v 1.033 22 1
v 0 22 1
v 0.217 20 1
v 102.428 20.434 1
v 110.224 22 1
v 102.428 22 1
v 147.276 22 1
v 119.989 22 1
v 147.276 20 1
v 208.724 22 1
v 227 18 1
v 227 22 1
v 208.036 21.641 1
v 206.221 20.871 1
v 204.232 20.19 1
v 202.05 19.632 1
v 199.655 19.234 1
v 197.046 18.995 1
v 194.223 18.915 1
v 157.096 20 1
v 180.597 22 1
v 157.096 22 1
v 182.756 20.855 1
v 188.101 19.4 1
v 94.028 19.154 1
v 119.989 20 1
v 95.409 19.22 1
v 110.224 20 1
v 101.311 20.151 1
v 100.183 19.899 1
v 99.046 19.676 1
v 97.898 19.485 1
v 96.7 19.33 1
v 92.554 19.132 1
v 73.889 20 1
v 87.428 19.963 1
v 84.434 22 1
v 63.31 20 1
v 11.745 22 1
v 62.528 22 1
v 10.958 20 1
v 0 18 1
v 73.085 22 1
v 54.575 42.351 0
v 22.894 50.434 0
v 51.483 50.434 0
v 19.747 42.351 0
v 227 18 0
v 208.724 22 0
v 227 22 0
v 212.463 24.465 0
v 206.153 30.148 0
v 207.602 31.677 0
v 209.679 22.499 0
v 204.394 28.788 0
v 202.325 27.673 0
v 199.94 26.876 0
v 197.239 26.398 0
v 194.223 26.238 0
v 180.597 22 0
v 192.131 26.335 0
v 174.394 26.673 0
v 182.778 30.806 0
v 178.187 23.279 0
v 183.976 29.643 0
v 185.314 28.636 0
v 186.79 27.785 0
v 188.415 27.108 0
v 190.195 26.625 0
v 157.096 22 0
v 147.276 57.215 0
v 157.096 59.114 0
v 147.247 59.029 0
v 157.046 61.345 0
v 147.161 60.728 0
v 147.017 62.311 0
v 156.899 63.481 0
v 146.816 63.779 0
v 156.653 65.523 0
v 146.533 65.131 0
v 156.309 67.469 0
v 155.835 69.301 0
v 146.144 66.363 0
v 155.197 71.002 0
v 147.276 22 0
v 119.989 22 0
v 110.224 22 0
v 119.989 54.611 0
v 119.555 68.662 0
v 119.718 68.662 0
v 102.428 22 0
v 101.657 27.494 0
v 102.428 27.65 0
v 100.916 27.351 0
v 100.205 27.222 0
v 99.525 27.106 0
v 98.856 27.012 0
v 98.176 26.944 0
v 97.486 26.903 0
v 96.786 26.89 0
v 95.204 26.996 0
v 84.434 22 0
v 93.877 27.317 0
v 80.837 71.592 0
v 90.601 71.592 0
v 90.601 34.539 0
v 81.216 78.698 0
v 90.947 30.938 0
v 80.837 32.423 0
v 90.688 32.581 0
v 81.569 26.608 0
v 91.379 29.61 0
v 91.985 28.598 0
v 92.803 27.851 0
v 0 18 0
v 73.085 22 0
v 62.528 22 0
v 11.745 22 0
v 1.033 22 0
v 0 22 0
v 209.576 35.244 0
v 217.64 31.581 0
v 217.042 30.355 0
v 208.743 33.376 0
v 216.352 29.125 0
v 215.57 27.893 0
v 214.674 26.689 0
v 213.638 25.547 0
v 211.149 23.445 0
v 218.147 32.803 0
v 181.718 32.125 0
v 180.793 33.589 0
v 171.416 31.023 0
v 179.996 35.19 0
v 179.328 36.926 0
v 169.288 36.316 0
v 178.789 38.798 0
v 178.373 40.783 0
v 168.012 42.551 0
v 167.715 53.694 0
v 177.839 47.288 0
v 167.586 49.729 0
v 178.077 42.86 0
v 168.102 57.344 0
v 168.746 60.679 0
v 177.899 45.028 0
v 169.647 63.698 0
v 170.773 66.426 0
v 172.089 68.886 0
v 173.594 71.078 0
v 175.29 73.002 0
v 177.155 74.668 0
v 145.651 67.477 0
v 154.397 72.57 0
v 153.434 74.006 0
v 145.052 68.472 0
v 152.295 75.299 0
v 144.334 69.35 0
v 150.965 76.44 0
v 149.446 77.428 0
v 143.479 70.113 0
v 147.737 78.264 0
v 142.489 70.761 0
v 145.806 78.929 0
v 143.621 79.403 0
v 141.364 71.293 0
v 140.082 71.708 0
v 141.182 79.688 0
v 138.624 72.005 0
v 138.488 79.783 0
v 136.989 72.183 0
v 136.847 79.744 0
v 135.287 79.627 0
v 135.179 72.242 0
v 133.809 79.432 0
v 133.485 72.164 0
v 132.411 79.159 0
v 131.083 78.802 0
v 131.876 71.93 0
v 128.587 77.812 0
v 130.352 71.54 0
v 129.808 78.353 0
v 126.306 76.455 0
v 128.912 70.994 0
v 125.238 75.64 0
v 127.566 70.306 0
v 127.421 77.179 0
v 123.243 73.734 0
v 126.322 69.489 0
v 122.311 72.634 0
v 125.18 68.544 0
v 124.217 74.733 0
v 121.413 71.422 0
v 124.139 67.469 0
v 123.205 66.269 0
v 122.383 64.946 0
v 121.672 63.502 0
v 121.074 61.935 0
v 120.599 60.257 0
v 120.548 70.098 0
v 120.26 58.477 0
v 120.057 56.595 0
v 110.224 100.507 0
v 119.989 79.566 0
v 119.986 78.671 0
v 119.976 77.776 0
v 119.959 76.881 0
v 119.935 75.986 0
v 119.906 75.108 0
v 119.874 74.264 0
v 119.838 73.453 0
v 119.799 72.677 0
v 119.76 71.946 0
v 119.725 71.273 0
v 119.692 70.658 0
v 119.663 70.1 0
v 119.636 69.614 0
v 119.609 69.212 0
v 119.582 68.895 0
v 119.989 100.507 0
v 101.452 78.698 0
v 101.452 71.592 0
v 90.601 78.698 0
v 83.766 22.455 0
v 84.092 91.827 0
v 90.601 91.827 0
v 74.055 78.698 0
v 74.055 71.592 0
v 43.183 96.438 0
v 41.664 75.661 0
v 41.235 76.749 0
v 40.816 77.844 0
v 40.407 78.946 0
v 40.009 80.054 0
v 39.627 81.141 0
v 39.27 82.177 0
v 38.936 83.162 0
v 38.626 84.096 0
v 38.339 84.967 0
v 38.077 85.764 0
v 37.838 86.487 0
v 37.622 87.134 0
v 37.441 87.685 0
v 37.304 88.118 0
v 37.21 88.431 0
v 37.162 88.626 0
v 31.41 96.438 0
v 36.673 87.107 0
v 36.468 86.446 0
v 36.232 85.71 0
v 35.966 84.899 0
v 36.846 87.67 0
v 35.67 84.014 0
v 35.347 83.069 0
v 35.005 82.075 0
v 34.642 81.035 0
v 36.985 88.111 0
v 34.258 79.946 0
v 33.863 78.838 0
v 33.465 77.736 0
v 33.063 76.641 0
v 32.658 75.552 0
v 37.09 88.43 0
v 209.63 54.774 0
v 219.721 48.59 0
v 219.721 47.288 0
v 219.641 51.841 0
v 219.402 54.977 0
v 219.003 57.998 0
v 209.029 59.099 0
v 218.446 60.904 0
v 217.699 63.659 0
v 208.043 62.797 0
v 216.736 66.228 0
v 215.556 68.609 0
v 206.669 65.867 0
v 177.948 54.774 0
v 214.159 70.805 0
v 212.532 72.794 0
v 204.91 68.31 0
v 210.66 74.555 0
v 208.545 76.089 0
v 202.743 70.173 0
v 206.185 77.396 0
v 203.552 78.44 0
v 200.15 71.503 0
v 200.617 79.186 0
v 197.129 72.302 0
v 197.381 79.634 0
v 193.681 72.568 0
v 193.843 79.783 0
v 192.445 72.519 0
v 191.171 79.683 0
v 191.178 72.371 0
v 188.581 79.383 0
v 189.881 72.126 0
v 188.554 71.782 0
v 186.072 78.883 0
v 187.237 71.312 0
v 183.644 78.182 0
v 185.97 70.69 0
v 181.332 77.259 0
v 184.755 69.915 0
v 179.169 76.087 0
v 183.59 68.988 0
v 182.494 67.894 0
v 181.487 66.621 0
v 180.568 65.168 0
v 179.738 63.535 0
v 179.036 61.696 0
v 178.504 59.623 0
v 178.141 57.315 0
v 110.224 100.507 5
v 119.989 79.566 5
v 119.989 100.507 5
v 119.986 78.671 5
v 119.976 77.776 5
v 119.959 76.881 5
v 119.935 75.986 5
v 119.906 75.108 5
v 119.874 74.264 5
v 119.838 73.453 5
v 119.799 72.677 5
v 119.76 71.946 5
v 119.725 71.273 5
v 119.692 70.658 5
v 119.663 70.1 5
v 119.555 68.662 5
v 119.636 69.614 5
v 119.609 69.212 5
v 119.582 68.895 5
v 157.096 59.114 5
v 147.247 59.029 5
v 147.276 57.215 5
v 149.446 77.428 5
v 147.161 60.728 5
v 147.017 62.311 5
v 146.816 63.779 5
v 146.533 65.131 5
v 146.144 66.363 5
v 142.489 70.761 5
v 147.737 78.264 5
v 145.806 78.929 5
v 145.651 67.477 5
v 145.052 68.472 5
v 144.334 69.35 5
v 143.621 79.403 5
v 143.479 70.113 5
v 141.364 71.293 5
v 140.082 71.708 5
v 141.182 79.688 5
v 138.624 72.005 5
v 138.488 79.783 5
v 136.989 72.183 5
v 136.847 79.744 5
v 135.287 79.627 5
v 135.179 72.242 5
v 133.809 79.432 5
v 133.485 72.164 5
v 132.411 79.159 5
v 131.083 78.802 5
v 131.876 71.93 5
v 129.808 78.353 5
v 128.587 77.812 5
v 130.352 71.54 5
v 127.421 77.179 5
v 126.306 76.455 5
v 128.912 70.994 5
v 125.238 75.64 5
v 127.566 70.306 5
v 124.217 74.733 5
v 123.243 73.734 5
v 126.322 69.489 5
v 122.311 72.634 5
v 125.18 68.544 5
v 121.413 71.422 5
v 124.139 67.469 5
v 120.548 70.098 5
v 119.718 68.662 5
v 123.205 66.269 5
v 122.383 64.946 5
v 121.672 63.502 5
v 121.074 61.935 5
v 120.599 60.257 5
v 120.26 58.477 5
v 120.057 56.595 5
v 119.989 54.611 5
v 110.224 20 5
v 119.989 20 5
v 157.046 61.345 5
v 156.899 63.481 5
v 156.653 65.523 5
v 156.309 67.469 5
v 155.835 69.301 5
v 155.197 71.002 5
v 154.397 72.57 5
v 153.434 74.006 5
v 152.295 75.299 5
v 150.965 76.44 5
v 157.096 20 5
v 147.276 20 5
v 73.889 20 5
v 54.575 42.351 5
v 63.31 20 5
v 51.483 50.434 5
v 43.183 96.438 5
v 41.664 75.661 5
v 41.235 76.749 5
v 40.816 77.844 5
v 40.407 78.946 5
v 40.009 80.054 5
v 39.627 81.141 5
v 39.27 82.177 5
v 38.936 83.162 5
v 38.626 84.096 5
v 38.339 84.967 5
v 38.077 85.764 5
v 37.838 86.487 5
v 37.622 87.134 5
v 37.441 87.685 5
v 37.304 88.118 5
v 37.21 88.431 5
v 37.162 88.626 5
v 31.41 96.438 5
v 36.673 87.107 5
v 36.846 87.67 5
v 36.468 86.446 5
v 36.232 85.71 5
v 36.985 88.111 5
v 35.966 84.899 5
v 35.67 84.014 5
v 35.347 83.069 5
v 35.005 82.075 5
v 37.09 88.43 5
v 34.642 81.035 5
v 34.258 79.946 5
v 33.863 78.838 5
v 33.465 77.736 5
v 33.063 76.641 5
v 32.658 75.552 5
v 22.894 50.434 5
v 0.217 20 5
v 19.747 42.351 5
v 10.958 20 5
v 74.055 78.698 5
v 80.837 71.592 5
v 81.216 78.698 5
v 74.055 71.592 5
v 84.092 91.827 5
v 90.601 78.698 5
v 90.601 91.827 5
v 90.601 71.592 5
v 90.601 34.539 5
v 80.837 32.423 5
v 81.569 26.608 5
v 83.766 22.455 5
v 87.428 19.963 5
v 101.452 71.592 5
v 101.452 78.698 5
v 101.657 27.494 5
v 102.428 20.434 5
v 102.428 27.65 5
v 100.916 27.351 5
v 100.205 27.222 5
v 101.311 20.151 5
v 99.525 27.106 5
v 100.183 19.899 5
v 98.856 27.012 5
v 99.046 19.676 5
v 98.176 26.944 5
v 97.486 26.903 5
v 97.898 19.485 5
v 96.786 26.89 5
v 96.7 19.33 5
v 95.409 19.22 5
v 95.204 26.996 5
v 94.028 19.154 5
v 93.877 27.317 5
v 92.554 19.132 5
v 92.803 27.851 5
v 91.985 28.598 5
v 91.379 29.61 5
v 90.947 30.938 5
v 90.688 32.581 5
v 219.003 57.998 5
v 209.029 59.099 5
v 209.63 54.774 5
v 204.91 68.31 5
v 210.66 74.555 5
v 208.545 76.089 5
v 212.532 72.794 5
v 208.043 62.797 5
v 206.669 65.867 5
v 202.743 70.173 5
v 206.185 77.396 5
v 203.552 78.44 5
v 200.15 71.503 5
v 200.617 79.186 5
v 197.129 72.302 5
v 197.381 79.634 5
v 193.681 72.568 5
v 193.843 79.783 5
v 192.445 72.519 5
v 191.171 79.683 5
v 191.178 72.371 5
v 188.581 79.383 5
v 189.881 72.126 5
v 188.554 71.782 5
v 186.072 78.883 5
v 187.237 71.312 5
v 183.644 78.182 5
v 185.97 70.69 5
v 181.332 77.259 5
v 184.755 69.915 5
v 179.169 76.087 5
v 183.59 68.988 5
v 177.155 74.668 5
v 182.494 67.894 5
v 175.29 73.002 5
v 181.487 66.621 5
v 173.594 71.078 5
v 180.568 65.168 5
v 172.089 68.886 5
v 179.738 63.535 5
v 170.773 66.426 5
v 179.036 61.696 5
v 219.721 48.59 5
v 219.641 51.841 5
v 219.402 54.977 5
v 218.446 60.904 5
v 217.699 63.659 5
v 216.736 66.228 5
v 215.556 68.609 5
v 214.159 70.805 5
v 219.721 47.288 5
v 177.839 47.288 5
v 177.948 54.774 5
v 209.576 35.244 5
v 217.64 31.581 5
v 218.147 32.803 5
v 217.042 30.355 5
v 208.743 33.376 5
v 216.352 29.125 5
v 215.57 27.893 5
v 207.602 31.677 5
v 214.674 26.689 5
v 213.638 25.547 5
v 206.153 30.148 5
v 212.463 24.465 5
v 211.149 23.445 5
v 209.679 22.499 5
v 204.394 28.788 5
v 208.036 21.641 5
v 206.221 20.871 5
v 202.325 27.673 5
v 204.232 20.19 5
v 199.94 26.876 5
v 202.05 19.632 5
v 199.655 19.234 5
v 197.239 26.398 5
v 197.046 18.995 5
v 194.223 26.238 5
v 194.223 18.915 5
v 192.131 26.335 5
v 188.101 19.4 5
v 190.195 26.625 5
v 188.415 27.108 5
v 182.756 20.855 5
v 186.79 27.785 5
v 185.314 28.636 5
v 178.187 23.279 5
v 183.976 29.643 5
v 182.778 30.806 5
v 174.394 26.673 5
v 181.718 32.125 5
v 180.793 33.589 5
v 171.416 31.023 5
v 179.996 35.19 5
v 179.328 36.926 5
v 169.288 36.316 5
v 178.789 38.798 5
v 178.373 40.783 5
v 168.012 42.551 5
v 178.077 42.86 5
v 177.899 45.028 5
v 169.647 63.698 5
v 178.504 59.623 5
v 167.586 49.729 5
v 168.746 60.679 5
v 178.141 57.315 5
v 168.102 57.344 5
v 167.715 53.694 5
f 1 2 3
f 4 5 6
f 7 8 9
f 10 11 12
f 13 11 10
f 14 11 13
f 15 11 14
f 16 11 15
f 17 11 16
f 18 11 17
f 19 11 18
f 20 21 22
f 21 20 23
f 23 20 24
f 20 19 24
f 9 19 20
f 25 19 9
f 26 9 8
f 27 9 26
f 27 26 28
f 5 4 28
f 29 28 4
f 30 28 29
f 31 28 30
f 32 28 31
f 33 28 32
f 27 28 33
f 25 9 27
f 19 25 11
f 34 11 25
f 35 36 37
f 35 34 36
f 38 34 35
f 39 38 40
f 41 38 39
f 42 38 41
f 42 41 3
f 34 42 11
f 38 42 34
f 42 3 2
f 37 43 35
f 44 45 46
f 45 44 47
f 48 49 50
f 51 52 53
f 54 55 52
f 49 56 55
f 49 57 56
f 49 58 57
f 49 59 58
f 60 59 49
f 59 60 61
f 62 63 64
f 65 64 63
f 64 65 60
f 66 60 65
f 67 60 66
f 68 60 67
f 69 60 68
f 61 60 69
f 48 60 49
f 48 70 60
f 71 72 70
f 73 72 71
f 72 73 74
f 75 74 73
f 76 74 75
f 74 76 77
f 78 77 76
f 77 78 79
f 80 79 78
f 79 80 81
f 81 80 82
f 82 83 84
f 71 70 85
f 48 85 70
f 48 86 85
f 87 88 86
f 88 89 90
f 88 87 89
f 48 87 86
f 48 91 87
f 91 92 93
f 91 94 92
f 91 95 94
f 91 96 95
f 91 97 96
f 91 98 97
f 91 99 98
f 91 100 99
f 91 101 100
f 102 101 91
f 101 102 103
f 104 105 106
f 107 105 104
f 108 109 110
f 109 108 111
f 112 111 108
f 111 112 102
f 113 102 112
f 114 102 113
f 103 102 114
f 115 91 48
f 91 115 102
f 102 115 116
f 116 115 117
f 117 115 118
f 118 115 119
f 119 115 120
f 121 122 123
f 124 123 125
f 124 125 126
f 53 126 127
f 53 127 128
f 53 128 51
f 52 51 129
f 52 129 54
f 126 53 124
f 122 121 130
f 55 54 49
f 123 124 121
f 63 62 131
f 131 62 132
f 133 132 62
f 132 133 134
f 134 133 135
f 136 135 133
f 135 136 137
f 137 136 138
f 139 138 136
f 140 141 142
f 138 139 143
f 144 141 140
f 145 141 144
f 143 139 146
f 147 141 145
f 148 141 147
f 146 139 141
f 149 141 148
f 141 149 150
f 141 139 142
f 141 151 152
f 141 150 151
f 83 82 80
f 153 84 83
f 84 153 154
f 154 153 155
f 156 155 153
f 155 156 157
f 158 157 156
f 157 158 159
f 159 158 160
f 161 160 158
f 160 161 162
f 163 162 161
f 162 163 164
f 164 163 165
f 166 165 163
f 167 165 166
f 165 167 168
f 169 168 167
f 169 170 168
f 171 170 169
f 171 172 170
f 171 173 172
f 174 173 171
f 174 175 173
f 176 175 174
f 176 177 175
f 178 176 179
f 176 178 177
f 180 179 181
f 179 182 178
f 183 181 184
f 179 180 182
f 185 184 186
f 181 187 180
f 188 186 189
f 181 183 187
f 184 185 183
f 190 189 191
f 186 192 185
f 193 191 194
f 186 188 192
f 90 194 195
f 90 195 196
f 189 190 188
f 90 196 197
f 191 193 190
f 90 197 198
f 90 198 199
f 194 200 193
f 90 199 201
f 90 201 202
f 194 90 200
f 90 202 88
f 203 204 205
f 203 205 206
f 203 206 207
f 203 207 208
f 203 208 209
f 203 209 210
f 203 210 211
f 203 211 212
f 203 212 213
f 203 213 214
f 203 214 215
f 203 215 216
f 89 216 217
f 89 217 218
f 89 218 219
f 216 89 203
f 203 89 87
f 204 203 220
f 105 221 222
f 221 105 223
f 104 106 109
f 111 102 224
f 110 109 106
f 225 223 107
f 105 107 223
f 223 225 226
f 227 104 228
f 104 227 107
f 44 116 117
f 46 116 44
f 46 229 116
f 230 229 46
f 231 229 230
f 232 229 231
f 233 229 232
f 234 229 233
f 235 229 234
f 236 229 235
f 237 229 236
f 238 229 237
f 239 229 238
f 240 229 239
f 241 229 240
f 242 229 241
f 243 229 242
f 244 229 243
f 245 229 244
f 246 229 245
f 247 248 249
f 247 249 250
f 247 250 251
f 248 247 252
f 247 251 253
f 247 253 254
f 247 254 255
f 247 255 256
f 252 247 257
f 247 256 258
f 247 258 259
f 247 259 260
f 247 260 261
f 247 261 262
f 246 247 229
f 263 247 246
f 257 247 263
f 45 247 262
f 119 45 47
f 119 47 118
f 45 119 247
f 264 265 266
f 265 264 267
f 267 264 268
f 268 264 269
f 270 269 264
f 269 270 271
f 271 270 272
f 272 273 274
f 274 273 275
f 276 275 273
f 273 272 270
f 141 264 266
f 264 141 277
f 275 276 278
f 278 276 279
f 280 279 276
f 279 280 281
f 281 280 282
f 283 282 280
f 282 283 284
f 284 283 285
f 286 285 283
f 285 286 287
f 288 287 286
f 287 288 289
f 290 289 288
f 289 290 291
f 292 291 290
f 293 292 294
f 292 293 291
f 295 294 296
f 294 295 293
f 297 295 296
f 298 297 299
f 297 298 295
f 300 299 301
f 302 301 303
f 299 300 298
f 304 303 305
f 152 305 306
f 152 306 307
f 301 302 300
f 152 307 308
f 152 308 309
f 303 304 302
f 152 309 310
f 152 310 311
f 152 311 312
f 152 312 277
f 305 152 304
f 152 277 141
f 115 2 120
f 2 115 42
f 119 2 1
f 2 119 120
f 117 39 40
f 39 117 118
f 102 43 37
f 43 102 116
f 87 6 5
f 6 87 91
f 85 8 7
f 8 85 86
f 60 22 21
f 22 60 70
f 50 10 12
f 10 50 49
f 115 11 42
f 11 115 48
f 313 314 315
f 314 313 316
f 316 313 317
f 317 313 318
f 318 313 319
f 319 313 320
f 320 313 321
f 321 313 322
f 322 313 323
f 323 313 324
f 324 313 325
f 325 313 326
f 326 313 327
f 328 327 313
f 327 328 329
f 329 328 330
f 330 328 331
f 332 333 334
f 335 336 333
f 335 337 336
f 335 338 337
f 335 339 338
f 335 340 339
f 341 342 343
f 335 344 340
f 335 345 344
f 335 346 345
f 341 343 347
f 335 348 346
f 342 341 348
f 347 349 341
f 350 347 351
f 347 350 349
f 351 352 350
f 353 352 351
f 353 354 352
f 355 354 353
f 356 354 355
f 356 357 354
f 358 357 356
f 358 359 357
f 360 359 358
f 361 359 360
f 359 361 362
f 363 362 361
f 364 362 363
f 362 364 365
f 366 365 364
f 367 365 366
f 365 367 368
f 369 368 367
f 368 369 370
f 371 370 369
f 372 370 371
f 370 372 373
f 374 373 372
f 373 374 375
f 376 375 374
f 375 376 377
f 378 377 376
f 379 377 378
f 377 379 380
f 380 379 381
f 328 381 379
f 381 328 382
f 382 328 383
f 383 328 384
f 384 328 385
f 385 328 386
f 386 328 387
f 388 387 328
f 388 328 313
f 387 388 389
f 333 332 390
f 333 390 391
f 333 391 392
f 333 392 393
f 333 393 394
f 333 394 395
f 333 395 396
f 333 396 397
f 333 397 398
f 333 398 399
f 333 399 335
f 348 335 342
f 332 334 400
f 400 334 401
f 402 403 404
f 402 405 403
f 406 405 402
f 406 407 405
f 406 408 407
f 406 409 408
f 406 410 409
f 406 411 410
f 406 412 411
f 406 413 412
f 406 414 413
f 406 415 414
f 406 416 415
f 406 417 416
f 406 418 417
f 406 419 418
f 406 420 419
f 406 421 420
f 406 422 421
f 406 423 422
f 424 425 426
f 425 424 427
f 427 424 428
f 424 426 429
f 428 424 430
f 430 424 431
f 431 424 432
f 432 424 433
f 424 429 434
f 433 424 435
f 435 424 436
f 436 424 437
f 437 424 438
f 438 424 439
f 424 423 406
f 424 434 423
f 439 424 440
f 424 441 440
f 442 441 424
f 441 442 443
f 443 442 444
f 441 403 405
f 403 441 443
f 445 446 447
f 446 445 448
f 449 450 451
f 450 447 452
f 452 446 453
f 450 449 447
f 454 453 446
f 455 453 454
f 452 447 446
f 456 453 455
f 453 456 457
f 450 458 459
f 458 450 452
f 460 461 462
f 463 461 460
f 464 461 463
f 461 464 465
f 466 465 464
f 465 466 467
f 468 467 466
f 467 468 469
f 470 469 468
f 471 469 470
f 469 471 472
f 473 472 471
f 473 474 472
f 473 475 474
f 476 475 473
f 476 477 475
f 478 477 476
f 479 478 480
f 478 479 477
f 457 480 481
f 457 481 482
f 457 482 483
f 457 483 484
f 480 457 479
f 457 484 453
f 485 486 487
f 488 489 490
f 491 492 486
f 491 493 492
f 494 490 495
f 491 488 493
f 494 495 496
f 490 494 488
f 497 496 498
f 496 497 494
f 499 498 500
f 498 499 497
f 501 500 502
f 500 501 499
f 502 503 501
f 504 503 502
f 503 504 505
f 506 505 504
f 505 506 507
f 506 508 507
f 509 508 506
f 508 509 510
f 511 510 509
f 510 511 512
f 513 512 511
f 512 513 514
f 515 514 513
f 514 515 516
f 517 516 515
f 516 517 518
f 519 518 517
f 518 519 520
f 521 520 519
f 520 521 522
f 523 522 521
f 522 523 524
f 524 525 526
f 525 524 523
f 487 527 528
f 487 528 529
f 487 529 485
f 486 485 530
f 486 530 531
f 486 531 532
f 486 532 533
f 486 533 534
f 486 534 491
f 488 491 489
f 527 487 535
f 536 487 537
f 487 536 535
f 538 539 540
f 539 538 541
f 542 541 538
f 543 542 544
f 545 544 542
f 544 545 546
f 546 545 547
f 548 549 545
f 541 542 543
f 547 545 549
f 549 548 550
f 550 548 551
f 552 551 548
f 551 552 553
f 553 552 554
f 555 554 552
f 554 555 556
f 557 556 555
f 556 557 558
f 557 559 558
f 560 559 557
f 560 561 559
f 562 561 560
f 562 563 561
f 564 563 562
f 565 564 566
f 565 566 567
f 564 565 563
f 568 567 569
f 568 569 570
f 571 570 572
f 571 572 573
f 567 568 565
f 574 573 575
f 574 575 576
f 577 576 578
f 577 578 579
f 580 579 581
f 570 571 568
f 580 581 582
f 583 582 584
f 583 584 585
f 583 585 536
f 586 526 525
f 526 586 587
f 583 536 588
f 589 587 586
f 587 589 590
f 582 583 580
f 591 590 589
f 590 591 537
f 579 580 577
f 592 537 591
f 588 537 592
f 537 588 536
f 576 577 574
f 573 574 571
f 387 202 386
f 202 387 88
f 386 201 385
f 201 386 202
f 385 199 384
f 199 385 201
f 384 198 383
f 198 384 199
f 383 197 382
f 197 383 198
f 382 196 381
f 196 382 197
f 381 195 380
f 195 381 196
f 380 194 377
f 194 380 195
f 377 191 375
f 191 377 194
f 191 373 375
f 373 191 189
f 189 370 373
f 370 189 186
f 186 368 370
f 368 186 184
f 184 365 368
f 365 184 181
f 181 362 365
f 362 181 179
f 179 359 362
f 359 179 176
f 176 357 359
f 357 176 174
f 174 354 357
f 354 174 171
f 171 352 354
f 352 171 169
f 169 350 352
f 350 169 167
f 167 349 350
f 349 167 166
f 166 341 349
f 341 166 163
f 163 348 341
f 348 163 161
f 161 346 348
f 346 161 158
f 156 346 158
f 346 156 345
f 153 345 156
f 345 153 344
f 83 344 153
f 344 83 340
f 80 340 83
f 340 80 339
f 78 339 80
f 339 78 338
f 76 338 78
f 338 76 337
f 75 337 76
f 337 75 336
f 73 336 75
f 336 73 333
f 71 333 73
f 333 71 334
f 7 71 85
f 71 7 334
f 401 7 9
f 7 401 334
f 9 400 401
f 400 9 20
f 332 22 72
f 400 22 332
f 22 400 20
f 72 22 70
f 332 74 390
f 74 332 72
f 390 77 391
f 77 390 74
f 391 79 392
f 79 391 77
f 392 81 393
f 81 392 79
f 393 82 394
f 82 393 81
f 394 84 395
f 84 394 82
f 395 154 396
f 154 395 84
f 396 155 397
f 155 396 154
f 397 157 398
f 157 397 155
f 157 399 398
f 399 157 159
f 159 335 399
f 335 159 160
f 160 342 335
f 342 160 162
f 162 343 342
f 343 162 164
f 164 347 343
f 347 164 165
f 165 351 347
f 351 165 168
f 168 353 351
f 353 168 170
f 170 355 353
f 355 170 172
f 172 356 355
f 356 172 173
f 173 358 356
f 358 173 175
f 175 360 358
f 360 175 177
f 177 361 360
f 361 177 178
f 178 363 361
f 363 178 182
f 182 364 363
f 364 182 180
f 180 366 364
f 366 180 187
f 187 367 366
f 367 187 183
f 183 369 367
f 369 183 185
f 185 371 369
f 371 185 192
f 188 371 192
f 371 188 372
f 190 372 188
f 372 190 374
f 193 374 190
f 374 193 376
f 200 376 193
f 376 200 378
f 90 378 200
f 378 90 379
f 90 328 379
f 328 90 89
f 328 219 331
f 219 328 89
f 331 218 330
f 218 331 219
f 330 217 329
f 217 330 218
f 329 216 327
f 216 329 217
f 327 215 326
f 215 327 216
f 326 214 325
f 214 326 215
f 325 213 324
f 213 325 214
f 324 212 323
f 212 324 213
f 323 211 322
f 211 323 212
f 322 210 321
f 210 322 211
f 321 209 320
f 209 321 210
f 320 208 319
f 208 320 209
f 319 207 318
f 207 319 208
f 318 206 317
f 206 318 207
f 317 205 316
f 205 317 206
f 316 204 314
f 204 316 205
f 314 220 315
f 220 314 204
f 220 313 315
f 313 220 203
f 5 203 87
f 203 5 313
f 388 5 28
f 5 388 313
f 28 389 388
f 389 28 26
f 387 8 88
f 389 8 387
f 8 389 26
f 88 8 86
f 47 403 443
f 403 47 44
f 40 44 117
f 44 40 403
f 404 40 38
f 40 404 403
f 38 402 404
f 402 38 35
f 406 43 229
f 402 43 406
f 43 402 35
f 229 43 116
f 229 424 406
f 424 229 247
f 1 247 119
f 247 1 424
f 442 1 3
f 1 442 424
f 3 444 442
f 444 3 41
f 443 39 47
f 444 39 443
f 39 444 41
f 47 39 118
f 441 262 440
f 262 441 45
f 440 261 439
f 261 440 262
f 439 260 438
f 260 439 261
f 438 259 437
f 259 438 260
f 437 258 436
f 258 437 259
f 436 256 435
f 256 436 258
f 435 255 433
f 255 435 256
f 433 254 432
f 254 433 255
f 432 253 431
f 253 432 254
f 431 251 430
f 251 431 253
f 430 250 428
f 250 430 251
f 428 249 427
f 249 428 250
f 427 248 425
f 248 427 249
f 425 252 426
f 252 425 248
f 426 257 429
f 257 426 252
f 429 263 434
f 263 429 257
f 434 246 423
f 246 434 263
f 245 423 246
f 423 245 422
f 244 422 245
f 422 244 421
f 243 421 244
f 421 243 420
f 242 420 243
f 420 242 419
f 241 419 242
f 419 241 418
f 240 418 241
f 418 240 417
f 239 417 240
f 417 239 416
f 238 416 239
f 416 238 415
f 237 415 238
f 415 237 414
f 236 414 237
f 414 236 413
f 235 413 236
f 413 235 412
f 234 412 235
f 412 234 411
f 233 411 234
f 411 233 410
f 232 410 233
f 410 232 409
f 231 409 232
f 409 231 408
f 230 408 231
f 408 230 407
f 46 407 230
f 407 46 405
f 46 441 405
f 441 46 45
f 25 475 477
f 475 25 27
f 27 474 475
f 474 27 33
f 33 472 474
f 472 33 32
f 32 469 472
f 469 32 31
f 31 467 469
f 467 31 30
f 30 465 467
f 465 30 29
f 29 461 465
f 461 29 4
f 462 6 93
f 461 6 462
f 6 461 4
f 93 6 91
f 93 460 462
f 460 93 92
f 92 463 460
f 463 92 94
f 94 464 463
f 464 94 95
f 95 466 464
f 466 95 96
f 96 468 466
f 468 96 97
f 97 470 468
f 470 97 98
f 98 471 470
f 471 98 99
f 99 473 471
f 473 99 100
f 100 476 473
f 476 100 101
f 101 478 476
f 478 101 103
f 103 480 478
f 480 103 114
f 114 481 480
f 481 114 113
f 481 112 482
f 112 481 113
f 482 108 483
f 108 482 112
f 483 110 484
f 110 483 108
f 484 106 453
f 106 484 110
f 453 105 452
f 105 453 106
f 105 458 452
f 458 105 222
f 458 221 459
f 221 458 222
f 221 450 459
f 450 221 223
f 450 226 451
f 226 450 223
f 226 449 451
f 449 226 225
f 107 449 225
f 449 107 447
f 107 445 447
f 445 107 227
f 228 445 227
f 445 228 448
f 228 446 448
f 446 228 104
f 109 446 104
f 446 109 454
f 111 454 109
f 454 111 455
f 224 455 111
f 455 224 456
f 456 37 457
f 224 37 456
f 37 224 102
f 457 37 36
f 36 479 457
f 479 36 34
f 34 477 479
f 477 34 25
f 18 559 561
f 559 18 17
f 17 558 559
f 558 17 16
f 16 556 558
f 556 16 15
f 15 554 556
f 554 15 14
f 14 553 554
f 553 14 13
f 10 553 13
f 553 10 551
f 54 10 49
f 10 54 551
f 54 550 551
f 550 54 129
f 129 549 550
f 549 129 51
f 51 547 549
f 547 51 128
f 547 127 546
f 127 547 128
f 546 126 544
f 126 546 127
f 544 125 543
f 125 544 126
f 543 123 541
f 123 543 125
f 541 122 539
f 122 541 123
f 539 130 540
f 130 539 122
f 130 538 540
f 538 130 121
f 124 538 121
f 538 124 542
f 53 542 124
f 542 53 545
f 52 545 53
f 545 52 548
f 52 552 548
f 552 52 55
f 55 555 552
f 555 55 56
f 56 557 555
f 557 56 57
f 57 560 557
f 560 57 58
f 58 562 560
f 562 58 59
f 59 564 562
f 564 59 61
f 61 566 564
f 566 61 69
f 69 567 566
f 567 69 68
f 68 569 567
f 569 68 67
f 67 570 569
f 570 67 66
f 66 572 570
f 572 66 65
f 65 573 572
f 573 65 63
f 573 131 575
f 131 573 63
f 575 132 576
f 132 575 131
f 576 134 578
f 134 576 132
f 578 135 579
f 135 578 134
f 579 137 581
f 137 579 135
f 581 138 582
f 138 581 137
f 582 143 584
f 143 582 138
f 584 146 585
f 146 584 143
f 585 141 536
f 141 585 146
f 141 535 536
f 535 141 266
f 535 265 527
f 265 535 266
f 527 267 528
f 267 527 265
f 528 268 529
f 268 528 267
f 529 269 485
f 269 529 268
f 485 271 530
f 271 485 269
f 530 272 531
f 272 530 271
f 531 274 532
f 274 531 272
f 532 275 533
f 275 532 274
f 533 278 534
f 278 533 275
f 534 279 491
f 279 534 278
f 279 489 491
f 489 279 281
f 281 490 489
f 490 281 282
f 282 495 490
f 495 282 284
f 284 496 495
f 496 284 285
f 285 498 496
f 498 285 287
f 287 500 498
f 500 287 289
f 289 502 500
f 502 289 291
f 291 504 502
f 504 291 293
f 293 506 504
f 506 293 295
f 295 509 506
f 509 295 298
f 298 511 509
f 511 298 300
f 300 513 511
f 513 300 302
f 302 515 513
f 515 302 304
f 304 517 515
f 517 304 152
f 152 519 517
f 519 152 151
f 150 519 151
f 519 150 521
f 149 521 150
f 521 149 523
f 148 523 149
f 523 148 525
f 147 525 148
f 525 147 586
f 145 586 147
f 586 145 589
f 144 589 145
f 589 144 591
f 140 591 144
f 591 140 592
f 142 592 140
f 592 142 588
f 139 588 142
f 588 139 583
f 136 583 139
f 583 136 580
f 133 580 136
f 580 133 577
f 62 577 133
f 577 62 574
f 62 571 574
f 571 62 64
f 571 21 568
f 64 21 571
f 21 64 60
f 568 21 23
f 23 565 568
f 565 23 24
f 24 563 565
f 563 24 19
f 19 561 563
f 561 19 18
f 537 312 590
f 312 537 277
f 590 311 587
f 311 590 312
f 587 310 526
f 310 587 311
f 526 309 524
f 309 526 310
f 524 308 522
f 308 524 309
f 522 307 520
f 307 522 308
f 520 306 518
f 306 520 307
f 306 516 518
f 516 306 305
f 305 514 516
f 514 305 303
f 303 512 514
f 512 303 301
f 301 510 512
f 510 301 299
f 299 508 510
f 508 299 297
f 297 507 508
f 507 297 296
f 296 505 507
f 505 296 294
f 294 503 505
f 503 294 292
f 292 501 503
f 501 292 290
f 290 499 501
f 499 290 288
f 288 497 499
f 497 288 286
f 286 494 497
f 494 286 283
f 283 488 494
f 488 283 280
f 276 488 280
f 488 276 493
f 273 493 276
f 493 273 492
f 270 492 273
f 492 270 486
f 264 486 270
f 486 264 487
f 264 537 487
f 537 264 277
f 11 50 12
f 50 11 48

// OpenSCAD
logo_base_size=454;
logo_base_height=logo_base_size*.25;

pillar_z_offset = 2;
pillar_7_x_scale = .25;
pillar_7_z_scale =  5;

pillar_spacing = .1;
pillar_vs_base_scaling_factor = .6;

normal_pillar_base = .15;
wide_pillar_base = .25;


%cube([logo_base_size, logo_base_height,1.6]);
analytics_pillar_support_height = 230;


text_z=5;

difference(){
    union(){
        translate([0,18,0])
        cube([435,4,1]);

        translate([0,20,0])
        linear_extrude(height = text_z)
        text("Athena", font = "Liberation Sans", size=80);
                
        translate([340,7,0])
        resize([80,80])
        linear_extrude(height = text_z)
        import("/Users/virtuoso/Downloads/Athena_logo_pre_processed.dxf");
    }

    translate([logo_base_size/2,-10,-10])
    cube([300,300,300]);
}
